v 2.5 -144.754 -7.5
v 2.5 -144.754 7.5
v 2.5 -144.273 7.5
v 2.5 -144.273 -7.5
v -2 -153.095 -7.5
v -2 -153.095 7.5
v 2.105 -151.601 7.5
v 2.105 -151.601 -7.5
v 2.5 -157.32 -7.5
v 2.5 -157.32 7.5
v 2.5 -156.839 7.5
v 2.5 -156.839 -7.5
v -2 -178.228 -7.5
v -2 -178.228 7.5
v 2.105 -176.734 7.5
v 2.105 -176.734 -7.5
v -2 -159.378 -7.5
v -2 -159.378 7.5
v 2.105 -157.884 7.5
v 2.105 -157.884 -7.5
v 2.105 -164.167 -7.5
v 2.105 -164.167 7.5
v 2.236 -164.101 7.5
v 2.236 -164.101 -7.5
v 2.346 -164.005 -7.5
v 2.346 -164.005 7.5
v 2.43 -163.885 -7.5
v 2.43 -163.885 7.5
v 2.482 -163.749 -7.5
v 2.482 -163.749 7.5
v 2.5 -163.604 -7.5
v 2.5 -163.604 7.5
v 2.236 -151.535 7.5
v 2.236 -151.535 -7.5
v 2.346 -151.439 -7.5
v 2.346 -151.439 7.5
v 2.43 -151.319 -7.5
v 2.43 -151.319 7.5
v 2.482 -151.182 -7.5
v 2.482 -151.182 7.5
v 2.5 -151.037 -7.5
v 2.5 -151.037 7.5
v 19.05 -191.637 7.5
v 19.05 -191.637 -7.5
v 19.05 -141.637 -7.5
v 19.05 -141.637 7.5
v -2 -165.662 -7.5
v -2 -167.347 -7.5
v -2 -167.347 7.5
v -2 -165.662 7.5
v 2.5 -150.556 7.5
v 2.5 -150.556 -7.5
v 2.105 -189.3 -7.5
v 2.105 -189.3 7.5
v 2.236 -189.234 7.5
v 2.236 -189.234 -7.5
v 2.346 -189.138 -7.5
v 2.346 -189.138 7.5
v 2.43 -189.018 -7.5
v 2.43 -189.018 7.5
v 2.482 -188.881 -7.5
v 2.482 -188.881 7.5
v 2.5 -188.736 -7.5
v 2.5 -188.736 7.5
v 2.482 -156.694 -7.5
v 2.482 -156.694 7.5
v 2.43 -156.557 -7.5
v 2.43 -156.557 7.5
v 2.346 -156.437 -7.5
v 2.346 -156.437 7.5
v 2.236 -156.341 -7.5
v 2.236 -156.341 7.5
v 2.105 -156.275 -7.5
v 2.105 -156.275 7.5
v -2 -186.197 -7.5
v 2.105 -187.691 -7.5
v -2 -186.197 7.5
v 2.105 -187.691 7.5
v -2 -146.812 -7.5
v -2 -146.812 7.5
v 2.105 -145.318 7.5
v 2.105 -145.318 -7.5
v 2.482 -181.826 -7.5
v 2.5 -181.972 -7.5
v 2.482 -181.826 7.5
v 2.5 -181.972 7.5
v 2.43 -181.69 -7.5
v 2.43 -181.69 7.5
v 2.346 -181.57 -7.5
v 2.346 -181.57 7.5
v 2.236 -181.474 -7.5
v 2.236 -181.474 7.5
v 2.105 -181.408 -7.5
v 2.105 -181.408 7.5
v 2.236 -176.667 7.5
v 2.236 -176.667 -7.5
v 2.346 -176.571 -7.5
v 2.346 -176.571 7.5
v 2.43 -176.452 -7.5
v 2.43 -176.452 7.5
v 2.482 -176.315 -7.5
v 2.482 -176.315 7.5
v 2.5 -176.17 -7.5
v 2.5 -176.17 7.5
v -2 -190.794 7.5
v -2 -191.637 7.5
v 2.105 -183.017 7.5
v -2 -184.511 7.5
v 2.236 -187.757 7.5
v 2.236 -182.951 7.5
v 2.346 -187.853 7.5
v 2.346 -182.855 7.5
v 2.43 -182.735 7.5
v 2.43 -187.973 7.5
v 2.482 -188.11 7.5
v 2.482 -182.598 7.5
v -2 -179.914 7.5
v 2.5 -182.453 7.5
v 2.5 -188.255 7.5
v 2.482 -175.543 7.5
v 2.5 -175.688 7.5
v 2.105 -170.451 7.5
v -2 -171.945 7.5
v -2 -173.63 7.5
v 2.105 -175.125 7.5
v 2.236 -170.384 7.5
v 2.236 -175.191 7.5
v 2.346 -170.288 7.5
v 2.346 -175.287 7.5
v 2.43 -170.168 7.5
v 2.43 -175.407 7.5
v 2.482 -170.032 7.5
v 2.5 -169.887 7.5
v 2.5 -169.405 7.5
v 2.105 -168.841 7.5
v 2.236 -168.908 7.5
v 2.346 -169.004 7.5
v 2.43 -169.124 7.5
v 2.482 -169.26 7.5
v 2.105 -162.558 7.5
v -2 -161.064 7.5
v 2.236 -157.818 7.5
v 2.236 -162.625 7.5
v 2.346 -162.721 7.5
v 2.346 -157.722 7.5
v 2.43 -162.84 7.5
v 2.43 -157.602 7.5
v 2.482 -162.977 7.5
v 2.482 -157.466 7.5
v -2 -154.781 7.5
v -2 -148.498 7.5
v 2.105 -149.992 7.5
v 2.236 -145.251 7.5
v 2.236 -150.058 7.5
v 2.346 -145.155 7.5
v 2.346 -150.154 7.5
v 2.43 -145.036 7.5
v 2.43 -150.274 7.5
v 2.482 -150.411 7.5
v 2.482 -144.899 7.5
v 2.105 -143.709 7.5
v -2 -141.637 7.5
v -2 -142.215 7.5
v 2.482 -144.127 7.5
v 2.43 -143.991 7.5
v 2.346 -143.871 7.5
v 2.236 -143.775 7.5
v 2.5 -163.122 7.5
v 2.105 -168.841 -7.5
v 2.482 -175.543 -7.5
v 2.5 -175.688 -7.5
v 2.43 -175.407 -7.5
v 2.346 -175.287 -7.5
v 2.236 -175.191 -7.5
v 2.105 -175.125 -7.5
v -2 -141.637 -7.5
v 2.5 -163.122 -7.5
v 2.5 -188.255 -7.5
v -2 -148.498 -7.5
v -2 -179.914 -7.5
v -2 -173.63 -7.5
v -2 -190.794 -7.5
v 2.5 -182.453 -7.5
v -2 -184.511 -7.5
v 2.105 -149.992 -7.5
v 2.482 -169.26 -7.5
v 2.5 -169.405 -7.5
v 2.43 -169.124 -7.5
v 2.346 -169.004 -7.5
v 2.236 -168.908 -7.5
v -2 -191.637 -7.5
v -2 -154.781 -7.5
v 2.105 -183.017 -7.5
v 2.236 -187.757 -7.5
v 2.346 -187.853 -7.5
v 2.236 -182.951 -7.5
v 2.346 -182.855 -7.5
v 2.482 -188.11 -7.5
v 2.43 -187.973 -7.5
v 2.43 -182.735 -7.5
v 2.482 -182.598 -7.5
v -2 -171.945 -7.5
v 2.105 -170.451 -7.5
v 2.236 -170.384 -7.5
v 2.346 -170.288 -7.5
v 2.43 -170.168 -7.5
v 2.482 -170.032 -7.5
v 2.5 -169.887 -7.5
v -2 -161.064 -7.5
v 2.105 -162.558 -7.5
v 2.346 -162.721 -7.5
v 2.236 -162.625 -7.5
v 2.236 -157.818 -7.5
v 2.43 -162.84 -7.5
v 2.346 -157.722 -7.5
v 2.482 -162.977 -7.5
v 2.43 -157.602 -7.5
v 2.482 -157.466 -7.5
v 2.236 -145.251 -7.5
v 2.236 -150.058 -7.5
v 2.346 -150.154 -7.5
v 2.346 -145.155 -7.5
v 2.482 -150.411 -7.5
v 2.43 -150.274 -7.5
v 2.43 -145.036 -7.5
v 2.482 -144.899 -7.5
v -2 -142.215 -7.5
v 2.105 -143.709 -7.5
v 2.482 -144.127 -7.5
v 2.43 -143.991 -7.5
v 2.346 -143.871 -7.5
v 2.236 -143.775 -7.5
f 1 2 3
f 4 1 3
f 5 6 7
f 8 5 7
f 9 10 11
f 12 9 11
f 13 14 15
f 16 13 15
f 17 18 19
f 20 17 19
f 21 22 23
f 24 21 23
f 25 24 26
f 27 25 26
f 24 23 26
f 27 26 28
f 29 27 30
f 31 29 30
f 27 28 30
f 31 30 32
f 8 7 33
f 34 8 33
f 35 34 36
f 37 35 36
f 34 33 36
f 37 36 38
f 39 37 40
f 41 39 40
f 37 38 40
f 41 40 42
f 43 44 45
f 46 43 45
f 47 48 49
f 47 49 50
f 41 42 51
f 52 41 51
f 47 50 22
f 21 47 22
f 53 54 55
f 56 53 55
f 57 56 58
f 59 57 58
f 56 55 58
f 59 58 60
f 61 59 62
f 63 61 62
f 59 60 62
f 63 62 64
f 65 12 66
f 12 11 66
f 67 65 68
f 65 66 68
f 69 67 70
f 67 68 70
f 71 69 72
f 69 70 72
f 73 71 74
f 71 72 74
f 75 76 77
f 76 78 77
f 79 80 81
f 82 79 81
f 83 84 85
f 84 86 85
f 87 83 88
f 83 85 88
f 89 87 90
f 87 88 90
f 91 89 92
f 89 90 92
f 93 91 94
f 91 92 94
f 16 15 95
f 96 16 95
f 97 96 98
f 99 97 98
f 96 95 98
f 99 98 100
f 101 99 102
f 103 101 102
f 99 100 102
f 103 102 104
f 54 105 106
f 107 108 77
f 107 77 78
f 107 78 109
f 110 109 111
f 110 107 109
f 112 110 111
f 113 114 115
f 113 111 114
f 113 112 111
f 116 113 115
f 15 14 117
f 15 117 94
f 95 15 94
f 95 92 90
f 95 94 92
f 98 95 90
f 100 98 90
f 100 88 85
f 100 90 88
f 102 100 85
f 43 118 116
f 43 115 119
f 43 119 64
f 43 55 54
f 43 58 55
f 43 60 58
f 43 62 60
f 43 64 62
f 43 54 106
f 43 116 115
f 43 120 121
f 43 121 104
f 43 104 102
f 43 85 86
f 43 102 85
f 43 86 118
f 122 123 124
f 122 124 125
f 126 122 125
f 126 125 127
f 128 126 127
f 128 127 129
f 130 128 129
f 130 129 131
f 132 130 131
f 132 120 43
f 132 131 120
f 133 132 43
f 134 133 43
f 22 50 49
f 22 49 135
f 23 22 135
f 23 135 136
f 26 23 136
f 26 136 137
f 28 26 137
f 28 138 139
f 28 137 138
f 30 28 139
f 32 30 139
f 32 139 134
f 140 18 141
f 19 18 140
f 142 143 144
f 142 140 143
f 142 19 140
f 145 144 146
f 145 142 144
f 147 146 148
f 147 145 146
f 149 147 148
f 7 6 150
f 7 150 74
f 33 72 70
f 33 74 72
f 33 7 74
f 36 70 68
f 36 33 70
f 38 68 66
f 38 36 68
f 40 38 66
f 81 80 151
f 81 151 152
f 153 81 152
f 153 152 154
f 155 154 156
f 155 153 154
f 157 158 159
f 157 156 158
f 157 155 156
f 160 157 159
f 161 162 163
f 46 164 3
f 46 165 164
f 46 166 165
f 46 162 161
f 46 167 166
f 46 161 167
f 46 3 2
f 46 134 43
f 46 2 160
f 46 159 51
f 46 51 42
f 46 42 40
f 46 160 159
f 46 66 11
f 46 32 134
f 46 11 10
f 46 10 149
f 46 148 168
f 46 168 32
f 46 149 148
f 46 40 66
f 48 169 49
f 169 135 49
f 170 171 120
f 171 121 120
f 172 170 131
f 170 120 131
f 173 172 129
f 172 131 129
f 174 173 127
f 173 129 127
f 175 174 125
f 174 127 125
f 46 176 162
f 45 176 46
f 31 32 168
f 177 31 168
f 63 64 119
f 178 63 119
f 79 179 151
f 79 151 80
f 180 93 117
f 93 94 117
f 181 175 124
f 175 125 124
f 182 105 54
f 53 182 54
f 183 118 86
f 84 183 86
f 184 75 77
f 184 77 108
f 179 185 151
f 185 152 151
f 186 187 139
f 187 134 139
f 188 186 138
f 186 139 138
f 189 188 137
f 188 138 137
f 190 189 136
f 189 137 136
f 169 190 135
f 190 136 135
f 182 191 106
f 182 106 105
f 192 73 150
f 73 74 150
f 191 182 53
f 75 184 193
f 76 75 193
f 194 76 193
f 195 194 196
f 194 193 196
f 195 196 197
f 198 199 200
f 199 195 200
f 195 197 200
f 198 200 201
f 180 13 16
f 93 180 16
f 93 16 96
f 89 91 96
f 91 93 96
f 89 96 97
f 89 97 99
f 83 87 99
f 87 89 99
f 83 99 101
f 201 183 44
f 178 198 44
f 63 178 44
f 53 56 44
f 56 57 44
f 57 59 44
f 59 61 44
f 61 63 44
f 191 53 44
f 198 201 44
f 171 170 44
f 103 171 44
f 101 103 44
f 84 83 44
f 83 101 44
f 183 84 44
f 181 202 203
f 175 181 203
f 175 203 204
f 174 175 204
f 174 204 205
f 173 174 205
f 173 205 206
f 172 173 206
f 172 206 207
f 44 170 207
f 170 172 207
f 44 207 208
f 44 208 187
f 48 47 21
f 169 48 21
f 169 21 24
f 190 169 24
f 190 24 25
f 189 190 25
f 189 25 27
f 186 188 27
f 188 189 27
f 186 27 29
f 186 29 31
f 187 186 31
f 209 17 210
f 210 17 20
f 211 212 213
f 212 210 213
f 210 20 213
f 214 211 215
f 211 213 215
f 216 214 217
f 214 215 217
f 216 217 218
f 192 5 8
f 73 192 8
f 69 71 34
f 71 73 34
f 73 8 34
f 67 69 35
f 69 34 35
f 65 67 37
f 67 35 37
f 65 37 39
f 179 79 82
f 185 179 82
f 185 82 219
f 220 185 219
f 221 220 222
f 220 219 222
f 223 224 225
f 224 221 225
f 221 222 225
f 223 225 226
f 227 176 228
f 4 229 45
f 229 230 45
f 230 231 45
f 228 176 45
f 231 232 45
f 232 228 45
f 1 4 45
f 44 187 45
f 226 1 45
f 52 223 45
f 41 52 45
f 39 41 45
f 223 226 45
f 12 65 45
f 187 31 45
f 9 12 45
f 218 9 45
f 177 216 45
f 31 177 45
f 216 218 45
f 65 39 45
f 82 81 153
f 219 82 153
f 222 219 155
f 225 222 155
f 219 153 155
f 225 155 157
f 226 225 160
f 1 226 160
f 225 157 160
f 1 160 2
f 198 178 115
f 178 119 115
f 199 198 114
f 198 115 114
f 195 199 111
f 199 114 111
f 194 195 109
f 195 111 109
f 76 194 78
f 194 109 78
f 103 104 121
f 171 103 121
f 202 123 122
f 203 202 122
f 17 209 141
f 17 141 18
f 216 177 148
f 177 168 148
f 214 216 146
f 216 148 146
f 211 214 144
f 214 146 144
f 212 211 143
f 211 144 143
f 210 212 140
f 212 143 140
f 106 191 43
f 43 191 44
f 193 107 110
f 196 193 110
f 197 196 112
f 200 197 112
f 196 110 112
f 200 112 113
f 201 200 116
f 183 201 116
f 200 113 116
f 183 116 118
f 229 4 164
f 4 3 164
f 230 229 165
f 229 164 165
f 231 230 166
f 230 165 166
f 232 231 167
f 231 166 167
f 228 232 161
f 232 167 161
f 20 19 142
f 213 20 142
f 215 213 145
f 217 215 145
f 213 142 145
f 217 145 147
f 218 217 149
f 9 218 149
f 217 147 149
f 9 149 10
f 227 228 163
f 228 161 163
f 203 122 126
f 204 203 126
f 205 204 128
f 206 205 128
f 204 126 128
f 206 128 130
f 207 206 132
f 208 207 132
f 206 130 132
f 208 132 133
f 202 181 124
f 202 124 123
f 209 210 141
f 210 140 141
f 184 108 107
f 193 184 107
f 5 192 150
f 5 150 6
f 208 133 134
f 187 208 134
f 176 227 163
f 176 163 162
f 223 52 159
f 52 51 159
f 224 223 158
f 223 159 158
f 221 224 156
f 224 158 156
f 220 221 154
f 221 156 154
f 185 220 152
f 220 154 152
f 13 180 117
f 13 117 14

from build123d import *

# Parameters (mm, degrees)
CI_DEPTH                   = 7.5
CI_DEPTH_BACK              = 7.5
SKETCHCI_M_STRSKETCHNAME_W = 21.04999997
SKETCHCI_M_STRSKETCHNAME_H = 194.778741597
CUT_EXTRUDE_522_DEPTH      = 7.5
PATTERN_LINEAR_579_COUNT   = 31
PATTERN_LINEAR_579_PITCH   = 6.283185307
EXTRUDE3_DEPTH             = 194.164953792
EXTRUDE3_DEPTH_BACK        = 194.164953792


with BuildPart() as part:
    # SketchCI.m_strSketchName → 拉伸CI (new, two sides: drawn at the far end of the back side and taken through both)
    with BuildSketch(Plane.XY.offset(-CI_DEPTH_BACK)):
        with Locations((8.525000015, -94.247778193)):
            Rectangle(SKETCHCI_M_STRSKETCHNAME_W, SKETCHCI_M_STRSKETCHNAME_H)
    extrude(amount=CI_DEPTH + CI_DEPTH_BACK)

    # Sketch 415 → Cut-Extrude 522 (cut, symmetric)
    with BuildSketch(Plane.XY):
        with BuildLine():
            Line((-1.99999997, 2.298736761), (-1.99999997, -2.298736761))
            Line((-1.99999997, -2.298736761), (2.105212054, -0.804561779))
            ThreePointArc((2.105212054, -0.804561779), (2.391491191, -0.584892071), (2.499999962, -0.240746215))
            Line((2.499999962, -0.240746215), (2.499999962, 0.240746215))
            ThreePointArc((2.499999962, 0.240746215), (2.391491191, 0.584892071), (2.105212054, 0.804561779))
            Line((2.105212054, 0.804561779), (-1.99999997, 2.298736761))
        make_face()
    cut_extrude_522 = extrude(amount=CUT_EXTRUDE_522_DEPTH, both=True, mode=Mode.SUBTRACT)

    # Pattern Linear 579: Cut-Extrude 522 ×31
    with Locations(*[(0, -i * PATTERN_LINEAR_579_PITCH, 0) for i in range(1, PATTERN_LINEAR_579_COUNT)]):
        add(cut_extrude_522, mode=Mode.SUBTRACT)

    # Sketch4 → Extrude3 (cut, two sides: drawn at the far end of the back side and taken through both)
    with BuildSketch(Plane.XY.offset(7.5).offset(-EXTRUDE3_DEPTH_BACK)):
        Polygon((328.075571379, -141.637148991), (19.05, -141.637148991), (-18.275447969, -141.637148991), (-327.301019347, -141.637148991), (-327.301019347, 476.413993766), (328.075571379, 476.413993766), align=None)
    extrude(amount=EXTRUDE3_DEPTH + EXTRUDE3_DEPTH_BACK, mode=Mode.SUBTRACT)


solid = part.part
